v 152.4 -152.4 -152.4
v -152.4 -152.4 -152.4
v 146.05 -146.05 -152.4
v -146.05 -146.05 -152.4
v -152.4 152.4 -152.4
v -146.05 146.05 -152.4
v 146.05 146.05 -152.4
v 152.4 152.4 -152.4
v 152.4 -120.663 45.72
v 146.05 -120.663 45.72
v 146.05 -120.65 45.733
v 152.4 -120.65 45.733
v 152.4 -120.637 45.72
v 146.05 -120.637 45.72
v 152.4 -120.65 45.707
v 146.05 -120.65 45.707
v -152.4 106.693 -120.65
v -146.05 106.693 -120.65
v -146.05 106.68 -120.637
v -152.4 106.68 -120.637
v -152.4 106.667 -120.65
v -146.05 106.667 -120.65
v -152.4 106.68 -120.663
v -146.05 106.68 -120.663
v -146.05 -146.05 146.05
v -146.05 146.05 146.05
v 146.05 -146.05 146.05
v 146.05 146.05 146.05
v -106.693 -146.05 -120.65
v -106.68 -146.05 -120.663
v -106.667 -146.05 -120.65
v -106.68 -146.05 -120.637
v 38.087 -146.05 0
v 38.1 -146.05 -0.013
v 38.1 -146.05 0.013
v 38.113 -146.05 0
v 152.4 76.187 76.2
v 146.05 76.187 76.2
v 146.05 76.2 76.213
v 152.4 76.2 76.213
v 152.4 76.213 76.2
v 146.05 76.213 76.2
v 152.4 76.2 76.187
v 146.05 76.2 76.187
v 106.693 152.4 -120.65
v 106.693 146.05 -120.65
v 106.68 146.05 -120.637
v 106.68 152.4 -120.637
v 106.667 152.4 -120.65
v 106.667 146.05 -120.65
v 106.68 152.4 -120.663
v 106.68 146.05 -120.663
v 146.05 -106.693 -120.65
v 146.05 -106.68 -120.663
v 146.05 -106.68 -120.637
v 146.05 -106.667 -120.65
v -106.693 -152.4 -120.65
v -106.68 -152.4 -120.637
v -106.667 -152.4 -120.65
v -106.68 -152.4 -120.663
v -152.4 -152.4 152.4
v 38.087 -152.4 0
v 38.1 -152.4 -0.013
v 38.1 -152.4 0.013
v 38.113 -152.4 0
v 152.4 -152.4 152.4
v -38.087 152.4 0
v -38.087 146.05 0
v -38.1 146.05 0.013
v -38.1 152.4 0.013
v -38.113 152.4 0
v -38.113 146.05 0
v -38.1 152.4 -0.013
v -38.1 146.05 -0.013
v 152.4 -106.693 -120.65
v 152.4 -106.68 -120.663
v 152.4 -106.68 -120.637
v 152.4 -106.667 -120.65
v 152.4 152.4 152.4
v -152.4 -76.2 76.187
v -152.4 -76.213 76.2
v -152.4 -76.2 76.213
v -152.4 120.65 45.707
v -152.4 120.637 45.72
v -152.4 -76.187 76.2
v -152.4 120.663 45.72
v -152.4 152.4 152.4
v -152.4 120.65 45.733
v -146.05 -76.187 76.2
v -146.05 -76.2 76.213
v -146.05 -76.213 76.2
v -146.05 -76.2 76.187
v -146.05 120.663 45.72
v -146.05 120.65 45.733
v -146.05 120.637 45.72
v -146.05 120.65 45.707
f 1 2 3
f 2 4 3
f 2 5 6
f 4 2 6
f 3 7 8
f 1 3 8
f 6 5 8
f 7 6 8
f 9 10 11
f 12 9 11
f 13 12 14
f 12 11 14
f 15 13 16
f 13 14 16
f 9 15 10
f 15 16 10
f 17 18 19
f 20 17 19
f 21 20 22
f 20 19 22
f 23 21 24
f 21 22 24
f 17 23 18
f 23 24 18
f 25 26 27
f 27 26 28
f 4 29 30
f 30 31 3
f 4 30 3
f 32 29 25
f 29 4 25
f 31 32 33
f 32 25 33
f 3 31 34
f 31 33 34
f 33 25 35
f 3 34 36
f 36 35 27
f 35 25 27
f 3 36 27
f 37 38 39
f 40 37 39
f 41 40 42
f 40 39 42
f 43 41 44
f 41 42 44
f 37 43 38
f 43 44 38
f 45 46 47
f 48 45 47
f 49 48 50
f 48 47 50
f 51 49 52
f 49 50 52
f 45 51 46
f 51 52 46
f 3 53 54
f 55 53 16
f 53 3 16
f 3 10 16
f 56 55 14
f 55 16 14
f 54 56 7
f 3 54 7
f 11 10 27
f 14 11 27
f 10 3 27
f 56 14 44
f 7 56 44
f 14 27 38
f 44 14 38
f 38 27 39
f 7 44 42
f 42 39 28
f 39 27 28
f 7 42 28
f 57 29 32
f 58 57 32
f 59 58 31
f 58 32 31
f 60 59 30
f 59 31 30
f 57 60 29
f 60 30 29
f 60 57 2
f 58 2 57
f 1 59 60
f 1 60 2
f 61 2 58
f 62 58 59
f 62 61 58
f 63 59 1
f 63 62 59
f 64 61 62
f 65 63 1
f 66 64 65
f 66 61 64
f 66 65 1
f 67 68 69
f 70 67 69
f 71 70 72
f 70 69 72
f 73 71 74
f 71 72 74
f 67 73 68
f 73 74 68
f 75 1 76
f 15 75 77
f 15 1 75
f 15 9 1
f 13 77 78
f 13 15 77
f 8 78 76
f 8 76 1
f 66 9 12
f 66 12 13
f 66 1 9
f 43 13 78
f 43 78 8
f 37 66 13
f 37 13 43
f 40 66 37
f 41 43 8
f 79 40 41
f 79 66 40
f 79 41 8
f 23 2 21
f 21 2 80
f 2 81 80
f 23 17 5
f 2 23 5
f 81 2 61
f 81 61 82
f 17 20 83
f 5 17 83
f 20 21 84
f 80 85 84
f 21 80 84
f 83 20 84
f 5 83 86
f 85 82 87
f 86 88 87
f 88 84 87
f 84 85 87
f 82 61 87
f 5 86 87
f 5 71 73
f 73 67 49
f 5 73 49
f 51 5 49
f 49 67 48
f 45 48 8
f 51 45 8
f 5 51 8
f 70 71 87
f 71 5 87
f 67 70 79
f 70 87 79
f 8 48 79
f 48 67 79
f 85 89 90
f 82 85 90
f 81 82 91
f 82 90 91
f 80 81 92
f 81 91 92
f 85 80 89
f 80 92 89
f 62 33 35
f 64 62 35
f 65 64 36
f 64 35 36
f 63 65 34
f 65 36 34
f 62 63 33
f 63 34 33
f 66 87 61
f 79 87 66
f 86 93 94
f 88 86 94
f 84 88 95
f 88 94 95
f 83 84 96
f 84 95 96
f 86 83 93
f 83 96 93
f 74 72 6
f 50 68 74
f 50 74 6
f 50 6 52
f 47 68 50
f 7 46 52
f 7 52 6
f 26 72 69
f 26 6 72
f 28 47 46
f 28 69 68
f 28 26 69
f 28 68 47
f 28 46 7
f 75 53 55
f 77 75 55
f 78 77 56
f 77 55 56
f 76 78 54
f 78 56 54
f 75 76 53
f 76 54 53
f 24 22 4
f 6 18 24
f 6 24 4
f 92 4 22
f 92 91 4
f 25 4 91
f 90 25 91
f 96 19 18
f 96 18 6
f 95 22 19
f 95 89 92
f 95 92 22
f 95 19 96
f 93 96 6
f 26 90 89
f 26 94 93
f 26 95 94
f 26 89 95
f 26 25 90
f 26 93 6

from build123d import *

# Parameters (mm, degrees)
F0_W      = 304.8
F0_H      = 304.8
F0_W_2    = 292.1
F0_H_2    = 292.1
F1_DEPTH  = 152.4
F2_W      = 304.8
F2_H      = 304.8
F3_DEPTH  = 6.35
F5_D      = 0.0254
F5_DEPTH  = 12.7
F6_D      = 0.0254
F6_DEPTH  = 12.7
F8_D      = 0.0254
F8_DEPTH  = 12.7
F9_D      = 0.0254
F9_DEPTH  = 12.7
F12_D     = 0.0254
F12_DEPTH = 12.7
F13_D     = 0.0254
F13_DEPTH = 12.7
F14_D     = 0.0254
F14_DEPTH = 12.7
F15_D     = 0.0254
F15_DEPTH = 12.7
F16_D     = 0.0254
F16_DEPTH = 12.7
F17_D     = 0.0254
F17_DEPTH = 12.7


with BuildPart() as f1:
    # F0 (on Top) → F1 (new body, symmetric)
    with BuildSketch(Plane.XY):
        Rectangle(F0_W, F0_H)
        Rectangle(F0_W_2, F0_H_2, mode=Mode.SUBTRACT)
    extrude(amount=F1_DEPTH, both=True)

    # F2 (on face) → F3 (join)
    with BuildSketch(Plane.XY.offset(152.4)):
        Rectangle(F2_W, F2_H)
    extrude(amount=-F3_DEPTH)

    # F5
    with Locations(Plane(origin=(0, 152.4, 0), x_dir=(-1, 0, 0), z_dir=(0, 1, 0))):
        with Locations((38.1, 0)):
            Hole(F5_D / 2, depth=F5_DEPTH)

    # F6
    with Locations(Plane(origin=(0, 152.4, 0), x_dir=(-1, 0, 0), z_dir=(0, 1, 0))):
        with Locations((-106.68, -120.65)):
            Hole(F6_D / 2, depth=F6_DEPTH)

    # F8
    with Locations(Plane.XZ.offset(152.4)):
        with Locations((-106.68, -120.65)):
            Hole(F8_D / 2, depth=F8_DEPTH)

    # F9
    with Locations(Plane.XZ.offset(152.4)):
        with Locations((38.1, 0)):
            Hole(F9_D / 2, depth=F9_DEPTH)

    # F12
    with Locations(Plane.YZ.offset(152.4)):
        with Locations((-106.68, -120.65)):
            Hole(F12_D / 2, depth=F12_DEPTH)

    # F13
    with Locations(Plane.YZ.offset(152.4)):
        with Locations((76.2, 76.2)):
            Hole(F13_D / 2, depth=F13_DEPTH)

    # F14
    with Locations(Plane.YZ.offset(152.4)):
        with Locations((-120.65, 45.72)):
            Hole(F14_D / 2, depth=F14_DEPTH)

    # F15
    with Locations(Plane(origin=(-152.4, 0, 0), x_dir=(0, -1, 0), z_dir=(-1, 0, 0))):
        with Locations((-106.68, -120.65)):
            Hole(F15_D / 2, depth=F15_DEPTH)

    # F16
    with Locations(Plane(origin=(-152.4, 0, 0), x_dir=(0, -1, 0), z_dir=(-1, 0, 0))):
        with Locations((-120.65, 45.72)):
            Hole(F16_D / 2, depth=F16_DEPTH)

    # F17
    with Locations(Plane(origin=(-152.4, 0, 0), x_dir=(0, -1, 0), z_dir=(-1, 0, 0))):
        with Locations((76.2, 76.2)):
            Hole(F17_D / 2, depth=F17_DEPTH)


solid = f1.part
